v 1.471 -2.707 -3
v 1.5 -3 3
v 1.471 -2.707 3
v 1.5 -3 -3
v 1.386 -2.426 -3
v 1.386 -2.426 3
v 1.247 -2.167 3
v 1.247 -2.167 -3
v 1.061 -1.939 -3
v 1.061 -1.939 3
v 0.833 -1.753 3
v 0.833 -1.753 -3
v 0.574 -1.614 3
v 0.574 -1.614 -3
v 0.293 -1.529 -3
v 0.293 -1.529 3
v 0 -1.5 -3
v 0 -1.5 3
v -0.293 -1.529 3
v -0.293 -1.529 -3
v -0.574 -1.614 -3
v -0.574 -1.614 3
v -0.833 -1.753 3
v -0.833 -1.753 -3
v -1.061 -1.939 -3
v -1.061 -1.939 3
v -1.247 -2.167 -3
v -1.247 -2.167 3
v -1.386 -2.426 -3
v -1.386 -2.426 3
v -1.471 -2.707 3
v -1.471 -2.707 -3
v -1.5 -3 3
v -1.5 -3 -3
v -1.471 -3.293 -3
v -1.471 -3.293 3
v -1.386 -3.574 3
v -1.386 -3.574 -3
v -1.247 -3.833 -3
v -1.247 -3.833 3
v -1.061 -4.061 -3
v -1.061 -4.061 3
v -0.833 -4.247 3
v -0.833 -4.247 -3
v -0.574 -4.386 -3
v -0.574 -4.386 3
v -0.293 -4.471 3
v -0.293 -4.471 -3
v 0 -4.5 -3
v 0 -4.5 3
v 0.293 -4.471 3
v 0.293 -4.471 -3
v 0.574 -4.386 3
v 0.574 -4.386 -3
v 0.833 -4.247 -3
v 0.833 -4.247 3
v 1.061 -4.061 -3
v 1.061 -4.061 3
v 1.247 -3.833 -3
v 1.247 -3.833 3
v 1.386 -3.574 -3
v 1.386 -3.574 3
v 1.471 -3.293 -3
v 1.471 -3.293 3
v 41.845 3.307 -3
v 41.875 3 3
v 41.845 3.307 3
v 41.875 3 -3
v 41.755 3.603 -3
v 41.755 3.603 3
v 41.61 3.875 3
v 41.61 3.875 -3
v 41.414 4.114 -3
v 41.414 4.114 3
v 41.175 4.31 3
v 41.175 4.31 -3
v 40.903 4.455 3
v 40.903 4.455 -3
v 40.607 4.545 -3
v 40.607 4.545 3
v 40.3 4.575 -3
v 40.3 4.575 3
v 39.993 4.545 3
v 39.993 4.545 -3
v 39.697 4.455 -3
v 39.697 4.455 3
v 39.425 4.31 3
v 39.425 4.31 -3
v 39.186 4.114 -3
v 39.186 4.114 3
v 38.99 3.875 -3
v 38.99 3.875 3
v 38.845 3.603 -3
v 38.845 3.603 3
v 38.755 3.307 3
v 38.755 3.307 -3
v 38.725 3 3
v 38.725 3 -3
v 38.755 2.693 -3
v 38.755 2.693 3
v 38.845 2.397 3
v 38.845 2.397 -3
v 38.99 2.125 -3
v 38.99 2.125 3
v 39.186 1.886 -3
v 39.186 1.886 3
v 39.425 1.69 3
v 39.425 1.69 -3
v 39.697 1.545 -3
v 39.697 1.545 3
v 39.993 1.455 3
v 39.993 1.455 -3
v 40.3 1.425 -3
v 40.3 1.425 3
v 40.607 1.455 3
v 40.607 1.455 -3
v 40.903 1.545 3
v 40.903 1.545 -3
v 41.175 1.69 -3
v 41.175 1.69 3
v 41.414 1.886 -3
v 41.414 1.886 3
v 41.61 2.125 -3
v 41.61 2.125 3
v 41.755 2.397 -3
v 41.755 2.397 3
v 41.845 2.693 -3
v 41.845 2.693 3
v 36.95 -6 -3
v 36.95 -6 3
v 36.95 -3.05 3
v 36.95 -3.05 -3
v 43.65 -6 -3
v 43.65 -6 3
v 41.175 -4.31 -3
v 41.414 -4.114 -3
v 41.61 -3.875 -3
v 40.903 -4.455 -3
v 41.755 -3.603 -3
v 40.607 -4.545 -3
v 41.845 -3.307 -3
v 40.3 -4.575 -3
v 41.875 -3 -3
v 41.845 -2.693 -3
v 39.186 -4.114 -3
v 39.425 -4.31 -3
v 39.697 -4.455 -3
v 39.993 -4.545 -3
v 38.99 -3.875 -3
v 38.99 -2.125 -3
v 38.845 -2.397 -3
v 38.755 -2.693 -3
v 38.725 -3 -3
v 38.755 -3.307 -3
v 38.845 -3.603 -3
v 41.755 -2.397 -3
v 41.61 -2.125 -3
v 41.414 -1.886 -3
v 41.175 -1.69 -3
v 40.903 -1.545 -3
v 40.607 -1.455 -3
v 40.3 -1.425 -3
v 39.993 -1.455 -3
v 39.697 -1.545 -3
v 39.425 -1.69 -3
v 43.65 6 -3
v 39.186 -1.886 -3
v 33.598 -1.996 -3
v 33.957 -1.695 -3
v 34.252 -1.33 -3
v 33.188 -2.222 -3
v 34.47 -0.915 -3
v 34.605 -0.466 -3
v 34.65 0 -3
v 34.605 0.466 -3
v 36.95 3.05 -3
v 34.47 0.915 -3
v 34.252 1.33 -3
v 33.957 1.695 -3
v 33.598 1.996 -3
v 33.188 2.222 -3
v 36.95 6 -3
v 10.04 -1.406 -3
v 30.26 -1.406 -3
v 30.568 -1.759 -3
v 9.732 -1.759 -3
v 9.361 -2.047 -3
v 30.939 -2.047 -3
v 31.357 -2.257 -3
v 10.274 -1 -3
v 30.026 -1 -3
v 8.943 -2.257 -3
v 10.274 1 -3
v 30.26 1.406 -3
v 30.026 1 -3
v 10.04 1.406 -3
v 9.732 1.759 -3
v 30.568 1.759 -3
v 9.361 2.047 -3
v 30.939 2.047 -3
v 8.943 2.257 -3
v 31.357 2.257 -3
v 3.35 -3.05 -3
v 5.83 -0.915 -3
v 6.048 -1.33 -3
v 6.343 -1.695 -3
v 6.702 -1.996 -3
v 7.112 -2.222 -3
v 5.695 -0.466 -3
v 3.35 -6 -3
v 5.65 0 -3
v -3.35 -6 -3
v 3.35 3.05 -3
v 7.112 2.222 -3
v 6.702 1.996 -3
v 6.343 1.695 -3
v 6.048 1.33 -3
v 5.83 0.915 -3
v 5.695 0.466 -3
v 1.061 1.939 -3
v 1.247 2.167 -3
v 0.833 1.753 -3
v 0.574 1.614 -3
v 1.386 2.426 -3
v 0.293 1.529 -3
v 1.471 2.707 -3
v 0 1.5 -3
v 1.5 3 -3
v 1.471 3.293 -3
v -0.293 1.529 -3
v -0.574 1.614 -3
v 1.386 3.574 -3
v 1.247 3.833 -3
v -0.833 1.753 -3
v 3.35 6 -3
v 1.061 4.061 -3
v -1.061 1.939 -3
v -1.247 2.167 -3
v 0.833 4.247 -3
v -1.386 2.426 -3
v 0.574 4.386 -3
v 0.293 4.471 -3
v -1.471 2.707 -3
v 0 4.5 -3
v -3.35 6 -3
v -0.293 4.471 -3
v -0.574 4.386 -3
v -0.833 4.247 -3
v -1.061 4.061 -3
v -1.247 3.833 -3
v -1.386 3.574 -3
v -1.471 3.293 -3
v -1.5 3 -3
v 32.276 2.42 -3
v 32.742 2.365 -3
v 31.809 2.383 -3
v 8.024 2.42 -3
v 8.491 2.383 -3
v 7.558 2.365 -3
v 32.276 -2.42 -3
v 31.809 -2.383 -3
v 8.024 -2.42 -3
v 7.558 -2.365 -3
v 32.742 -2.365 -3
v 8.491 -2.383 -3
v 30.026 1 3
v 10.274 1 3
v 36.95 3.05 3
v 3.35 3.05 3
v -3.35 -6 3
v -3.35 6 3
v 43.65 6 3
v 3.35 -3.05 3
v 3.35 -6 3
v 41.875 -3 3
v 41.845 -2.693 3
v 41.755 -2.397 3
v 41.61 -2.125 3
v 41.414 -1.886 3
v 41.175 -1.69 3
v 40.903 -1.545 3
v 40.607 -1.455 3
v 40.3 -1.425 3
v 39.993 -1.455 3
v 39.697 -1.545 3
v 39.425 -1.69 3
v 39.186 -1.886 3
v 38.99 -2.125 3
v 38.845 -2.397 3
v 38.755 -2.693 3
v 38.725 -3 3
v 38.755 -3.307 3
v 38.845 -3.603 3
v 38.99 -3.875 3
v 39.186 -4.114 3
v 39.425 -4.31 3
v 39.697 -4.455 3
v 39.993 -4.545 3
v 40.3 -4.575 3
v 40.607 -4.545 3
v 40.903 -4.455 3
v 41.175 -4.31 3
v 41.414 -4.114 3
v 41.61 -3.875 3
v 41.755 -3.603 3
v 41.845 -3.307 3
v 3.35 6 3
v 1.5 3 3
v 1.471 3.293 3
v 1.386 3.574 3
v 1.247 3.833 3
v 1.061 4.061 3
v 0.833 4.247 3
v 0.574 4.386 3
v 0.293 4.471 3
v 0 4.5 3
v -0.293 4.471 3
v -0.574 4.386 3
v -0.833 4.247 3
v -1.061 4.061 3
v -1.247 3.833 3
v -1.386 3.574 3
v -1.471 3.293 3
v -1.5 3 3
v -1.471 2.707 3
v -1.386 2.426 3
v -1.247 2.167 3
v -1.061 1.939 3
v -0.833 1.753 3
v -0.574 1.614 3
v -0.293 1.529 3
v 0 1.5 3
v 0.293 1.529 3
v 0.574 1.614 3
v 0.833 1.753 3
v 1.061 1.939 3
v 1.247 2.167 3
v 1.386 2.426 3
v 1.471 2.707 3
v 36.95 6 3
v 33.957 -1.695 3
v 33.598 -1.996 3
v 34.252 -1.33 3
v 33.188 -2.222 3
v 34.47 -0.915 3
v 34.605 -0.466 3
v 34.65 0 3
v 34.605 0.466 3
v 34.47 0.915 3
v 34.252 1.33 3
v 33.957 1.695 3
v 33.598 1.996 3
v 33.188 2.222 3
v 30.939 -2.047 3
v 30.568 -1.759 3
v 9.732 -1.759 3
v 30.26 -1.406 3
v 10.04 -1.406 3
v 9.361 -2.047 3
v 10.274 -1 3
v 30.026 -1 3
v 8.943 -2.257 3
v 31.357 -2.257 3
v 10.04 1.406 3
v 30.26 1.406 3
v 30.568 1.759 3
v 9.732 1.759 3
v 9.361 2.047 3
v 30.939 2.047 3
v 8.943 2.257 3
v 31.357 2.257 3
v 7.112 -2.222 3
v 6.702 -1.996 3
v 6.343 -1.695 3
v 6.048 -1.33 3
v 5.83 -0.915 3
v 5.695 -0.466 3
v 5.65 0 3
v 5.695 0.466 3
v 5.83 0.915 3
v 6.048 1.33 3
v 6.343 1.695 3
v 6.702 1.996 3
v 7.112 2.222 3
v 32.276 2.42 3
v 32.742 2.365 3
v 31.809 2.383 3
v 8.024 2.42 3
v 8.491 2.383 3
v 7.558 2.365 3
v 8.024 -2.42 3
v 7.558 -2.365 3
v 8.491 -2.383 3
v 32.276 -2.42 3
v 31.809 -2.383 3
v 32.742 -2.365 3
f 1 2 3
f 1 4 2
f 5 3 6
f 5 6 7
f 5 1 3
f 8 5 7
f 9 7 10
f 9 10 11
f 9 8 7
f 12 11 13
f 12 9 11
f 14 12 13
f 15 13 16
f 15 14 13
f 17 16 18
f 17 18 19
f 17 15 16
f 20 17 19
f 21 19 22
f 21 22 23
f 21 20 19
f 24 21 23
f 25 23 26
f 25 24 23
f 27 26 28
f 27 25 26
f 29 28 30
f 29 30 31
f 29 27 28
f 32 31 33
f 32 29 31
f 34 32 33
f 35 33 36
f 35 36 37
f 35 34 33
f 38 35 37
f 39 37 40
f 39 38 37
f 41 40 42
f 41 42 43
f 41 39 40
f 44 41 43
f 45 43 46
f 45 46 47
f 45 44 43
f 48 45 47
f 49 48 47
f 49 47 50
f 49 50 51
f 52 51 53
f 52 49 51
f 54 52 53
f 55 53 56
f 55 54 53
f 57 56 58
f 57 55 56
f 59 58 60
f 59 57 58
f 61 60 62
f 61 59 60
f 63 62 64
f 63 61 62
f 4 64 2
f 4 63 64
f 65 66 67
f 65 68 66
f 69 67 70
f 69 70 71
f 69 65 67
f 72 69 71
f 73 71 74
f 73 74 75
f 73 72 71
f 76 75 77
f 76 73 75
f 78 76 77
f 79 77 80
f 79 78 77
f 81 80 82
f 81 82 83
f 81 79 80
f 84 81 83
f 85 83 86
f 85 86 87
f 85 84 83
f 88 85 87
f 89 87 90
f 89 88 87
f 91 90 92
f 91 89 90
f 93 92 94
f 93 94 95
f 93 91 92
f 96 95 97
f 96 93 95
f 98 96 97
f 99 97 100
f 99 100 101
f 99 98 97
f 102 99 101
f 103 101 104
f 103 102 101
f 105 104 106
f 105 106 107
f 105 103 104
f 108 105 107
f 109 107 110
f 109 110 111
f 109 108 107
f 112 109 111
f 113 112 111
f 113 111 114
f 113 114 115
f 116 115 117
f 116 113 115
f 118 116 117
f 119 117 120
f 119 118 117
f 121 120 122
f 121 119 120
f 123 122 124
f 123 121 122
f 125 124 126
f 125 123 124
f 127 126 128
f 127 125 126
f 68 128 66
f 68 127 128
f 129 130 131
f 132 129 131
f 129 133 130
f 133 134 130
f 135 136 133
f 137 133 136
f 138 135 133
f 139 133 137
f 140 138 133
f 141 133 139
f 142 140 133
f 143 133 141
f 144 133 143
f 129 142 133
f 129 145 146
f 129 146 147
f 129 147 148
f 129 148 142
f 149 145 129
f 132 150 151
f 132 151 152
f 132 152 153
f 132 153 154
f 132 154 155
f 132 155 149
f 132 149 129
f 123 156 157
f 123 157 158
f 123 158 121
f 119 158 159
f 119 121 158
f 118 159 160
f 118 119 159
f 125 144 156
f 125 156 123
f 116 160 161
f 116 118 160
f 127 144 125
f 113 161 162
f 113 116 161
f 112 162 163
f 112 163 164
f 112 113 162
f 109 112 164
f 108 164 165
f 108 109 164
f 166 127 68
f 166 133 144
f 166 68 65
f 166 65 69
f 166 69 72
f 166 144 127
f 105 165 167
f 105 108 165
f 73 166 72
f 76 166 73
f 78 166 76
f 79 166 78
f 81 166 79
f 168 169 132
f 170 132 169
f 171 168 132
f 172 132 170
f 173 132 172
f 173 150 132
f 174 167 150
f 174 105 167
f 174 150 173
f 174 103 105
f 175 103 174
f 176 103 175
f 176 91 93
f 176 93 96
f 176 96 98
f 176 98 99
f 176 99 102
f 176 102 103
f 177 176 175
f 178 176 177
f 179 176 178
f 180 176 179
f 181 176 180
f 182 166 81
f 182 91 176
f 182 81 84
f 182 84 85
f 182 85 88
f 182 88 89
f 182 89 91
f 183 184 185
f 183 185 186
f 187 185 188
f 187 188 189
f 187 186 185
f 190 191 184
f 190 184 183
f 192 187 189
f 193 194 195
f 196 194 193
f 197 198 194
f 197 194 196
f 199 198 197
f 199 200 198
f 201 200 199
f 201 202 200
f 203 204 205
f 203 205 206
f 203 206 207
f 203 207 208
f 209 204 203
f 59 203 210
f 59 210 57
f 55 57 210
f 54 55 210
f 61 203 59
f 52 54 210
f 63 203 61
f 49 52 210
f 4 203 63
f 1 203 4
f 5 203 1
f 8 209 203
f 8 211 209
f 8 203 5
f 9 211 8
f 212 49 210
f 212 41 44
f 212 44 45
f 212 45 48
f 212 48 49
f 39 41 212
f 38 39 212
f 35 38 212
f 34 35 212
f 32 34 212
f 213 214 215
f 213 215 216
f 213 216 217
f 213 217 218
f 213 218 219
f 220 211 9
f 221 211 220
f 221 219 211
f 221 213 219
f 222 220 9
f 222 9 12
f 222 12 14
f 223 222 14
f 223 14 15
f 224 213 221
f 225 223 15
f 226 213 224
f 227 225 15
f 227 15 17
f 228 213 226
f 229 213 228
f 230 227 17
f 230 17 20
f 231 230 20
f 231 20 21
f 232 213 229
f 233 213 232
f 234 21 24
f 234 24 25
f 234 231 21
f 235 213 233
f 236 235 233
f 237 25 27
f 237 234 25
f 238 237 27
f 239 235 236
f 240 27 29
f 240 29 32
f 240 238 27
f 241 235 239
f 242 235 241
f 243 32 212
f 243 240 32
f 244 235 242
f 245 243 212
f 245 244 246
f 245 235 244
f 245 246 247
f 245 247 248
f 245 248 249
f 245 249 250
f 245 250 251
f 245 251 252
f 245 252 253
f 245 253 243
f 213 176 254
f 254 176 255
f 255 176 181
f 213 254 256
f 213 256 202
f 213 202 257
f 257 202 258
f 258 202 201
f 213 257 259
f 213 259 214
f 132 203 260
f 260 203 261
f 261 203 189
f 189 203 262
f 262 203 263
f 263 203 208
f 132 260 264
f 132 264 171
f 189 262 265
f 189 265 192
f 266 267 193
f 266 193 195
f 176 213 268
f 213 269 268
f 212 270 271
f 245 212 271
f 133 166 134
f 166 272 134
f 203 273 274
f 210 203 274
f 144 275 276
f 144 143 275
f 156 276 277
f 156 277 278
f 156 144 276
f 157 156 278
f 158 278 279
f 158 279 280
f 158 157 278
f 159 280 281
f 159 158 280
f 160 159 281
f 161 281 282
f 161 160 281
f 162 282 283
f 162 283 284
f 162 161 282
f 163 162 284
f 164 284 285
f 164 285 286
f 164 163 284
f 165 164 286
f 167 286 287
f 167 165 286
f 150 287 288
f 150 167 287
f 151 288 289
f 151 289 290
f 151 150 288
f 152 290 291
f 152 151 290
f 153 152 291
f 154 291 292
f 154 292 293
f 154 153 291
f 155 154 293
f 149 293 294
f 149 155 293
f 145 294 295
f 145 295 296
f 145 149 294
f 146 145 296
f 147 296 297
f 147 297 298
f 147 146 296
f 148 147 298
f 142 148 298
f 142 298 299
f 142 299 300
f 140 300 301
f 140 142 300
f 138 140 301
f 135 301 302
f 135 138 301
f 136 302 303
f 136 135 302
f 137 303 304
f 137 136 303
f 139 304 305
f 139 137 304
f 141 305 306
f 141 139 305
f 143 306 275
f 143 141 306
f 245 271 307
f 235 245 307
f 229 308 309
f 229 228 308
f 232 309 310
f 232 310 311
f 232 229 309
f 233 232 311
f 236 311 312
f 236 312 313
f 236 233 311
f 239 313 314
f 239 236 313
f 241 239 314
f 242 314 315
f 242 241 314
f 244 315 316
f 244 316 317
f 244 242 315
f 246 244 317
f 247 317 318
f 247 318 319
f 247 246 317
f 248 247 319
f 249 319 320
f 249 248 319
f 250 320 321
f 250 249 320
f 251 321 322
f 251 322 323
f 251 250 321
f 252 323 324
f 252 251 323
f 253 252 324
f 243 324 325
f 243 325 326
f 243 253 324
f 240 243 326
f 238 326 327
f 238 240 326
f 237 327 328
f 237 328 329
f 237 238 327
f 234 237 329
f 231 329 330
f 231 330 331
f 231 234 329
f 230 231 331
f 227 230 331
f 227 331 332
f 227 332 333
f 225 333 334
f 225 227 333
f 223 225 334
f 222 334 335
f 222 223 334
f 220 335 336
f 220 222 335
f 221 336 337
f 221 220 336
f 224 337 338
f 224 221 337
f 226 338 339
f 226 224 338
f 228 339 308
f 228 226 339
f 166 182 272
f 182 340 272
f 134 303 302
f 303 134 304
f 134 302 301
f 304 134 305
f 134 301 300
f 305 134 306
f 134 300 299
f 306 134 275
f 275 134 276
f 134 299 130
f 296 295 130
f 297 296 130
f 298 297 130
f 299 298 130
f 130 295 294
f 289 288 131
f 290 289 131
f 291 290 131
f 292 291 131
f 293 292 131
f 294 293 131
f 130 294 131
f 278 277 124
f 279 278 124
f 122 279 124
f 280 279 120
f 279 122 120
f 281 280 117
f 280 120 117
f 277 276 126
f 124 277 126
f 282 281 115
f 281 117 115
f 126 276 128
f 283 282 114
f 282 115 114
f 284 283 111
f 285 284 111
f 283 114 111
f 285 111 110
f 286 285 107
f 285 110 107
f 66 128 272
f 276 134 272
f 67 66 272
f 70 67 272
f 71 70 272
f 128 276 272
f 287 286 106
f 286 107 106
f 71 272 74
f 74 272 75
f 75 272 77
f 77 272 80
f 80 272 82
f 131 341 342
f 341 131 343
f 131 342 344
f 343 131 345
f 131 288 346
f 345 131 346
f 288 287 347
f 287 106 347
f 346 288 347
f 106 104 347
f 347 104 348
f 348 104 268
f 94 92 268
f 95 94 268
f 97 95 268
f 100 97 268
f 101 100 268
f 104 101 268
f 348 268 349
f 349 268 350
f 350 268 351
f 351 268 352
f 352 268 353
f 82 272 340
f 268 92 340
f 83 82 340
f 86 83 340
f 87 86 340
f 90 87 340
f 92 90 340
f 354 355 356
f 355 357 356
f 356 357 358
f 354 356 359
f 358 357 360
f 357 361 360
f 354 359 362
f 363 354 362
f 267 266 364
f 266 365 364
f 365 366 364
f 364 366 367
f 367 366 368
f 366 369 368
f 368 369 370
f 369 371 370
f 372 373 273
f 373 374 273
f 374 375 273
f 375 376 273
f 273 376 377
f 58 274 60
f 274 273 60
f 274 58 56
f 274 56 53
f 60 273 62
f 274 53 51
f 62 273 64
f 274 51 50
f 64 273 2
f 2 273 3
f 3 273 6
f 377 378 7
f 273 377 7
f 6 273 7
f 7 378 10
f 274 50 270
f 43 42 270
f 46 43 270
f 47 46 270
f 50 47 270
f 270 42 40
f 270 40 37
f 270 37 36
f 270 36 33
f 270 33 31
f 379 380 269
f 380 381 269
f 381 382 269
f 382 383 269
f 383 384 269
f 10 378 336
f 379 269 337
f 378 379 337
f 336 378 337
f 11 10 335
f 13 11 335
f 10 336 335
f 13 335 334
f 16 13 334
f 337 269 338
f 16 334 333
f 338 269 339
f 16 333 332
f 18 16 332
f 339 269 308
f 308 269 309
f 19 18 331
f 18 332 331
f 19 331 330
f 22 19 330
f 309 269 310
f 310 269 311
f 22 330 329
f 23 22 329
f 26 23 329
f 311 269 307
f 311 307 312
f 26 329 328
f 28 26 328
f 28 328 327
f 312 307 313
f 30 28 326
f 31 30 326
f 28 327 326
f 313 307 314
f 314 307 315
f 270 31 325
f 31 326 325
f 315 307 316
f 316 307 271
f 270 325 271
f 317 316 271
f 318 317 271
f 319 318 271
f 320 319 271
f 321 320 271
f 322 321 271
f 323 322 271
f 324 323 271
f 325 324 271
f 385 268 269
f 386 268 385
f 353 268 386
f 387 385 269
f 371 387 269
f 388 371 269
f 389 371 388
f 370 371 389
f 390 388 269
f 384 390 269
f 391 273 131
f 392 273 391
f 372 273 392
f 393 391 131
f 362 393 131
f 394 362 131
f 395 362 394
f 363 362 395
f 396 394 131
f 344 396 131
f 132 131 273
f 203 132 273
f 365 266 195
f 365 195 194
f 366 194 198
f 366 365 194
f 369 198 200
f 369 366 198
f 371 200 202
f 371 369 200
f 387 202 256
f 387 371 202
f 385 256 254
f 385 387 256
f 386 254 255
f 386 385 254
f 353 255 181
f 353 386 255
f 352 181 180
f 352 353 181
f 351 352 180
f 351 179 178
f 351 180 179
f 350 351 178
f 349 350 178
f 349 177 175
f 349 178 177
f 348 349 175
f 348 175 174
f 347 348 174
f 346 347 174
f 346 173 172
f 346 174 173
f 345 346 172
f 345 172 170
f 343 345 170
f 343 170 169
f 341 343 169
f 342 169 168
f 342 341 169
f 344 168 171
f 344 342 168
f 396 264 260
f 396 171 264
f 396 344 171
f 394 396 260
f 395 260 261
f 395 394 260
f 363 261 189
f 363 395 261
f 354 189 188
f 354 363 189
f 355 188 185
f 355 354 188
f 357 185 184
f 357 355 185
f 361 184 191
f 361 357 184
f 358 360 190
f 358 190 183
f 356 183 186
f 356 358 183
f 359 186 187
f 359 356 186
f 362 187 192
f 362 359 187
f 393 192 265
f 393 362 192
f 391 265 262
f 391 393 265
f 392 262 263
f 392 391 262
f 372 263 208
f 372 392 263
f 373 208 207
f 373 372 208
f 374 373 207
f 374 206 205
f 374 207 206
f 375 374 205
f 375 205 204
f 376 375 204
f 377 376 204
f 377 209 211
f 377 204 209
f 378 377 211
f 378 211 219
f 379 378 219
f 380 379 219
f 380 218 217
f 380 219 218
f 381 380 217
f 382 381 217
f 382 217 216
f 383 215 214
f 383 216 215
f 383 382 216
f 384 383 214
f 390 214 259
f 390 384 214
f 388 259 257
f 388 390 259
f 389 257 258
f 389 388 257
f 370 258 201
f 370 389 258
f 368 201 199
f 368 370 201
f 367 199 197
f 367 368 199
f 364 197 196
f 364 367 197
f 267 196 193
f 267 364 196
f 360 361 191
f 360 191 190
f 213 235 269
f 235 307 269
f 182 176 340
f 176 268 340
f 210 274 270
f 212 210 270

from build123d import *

# Parameters (mm, degrees)
SKETCH1_R           = 1.575
SKETCH1_R_2         = 1.5
BOSS_EXTRUDE1_DEPTH = 3
CUT_EXTRUDE1_DEPTH  = 45.467094576


with BuildPart() as part:
    # Sketch1 → Boss-Extrude1 (new, symmetric)
    with BuildSketch(Plane.XY):
        Polygon((-3.35, 6), (3.35, 6), (3.35, 3.05), (36.95, 3.05), (36.95, 6), (43.65, 6), (43.65, -6), (36.95, -6), (36.95, -3.05), (3.35, -3.05), (3.35, -6), (-3.35, -6), align=None)
        with Locations((40.3, 3)):
            Circle(SKETCH1_R, mode=Mode.SUBTRACT)
        with Locations((40.3, -3)):
            Circle(SKETCH1_R, mode=Mode.SUBTRACT)
        with Locations((0, 3)):
            Circle(SKETCH1_R_2, mode=Mode.SUBTRACT)
        with Locations((0, -3)):
            Circle(SKETCH1_R_2, mode=Mode.SUBTRACT)
    extrude(amount=BOSS_EXTRUDE1_DEPTH, both=True)

    # Sketch4 → Cut-Extrude1 (cut, through all)
    with BuildSketch(Plane.XY.offset(3)):
        with BuildLine():
            Line((10.273724121, 1), (30.026275879, 1))
            ThreePointArc((30.026275879, 1), (34.65, 0), (30.026275879, -1))
            Line((30.026275879, -1), (10.273724121, -1))
            ThreePointArc((10.273724121, -1), (5.65, 0), (10.273724121, 1))
        make_face()
    extrude(amount=-CUT_EXTRUDE1_DEPTH, mode=Mode.SUBTRACT)


solid = part.part
